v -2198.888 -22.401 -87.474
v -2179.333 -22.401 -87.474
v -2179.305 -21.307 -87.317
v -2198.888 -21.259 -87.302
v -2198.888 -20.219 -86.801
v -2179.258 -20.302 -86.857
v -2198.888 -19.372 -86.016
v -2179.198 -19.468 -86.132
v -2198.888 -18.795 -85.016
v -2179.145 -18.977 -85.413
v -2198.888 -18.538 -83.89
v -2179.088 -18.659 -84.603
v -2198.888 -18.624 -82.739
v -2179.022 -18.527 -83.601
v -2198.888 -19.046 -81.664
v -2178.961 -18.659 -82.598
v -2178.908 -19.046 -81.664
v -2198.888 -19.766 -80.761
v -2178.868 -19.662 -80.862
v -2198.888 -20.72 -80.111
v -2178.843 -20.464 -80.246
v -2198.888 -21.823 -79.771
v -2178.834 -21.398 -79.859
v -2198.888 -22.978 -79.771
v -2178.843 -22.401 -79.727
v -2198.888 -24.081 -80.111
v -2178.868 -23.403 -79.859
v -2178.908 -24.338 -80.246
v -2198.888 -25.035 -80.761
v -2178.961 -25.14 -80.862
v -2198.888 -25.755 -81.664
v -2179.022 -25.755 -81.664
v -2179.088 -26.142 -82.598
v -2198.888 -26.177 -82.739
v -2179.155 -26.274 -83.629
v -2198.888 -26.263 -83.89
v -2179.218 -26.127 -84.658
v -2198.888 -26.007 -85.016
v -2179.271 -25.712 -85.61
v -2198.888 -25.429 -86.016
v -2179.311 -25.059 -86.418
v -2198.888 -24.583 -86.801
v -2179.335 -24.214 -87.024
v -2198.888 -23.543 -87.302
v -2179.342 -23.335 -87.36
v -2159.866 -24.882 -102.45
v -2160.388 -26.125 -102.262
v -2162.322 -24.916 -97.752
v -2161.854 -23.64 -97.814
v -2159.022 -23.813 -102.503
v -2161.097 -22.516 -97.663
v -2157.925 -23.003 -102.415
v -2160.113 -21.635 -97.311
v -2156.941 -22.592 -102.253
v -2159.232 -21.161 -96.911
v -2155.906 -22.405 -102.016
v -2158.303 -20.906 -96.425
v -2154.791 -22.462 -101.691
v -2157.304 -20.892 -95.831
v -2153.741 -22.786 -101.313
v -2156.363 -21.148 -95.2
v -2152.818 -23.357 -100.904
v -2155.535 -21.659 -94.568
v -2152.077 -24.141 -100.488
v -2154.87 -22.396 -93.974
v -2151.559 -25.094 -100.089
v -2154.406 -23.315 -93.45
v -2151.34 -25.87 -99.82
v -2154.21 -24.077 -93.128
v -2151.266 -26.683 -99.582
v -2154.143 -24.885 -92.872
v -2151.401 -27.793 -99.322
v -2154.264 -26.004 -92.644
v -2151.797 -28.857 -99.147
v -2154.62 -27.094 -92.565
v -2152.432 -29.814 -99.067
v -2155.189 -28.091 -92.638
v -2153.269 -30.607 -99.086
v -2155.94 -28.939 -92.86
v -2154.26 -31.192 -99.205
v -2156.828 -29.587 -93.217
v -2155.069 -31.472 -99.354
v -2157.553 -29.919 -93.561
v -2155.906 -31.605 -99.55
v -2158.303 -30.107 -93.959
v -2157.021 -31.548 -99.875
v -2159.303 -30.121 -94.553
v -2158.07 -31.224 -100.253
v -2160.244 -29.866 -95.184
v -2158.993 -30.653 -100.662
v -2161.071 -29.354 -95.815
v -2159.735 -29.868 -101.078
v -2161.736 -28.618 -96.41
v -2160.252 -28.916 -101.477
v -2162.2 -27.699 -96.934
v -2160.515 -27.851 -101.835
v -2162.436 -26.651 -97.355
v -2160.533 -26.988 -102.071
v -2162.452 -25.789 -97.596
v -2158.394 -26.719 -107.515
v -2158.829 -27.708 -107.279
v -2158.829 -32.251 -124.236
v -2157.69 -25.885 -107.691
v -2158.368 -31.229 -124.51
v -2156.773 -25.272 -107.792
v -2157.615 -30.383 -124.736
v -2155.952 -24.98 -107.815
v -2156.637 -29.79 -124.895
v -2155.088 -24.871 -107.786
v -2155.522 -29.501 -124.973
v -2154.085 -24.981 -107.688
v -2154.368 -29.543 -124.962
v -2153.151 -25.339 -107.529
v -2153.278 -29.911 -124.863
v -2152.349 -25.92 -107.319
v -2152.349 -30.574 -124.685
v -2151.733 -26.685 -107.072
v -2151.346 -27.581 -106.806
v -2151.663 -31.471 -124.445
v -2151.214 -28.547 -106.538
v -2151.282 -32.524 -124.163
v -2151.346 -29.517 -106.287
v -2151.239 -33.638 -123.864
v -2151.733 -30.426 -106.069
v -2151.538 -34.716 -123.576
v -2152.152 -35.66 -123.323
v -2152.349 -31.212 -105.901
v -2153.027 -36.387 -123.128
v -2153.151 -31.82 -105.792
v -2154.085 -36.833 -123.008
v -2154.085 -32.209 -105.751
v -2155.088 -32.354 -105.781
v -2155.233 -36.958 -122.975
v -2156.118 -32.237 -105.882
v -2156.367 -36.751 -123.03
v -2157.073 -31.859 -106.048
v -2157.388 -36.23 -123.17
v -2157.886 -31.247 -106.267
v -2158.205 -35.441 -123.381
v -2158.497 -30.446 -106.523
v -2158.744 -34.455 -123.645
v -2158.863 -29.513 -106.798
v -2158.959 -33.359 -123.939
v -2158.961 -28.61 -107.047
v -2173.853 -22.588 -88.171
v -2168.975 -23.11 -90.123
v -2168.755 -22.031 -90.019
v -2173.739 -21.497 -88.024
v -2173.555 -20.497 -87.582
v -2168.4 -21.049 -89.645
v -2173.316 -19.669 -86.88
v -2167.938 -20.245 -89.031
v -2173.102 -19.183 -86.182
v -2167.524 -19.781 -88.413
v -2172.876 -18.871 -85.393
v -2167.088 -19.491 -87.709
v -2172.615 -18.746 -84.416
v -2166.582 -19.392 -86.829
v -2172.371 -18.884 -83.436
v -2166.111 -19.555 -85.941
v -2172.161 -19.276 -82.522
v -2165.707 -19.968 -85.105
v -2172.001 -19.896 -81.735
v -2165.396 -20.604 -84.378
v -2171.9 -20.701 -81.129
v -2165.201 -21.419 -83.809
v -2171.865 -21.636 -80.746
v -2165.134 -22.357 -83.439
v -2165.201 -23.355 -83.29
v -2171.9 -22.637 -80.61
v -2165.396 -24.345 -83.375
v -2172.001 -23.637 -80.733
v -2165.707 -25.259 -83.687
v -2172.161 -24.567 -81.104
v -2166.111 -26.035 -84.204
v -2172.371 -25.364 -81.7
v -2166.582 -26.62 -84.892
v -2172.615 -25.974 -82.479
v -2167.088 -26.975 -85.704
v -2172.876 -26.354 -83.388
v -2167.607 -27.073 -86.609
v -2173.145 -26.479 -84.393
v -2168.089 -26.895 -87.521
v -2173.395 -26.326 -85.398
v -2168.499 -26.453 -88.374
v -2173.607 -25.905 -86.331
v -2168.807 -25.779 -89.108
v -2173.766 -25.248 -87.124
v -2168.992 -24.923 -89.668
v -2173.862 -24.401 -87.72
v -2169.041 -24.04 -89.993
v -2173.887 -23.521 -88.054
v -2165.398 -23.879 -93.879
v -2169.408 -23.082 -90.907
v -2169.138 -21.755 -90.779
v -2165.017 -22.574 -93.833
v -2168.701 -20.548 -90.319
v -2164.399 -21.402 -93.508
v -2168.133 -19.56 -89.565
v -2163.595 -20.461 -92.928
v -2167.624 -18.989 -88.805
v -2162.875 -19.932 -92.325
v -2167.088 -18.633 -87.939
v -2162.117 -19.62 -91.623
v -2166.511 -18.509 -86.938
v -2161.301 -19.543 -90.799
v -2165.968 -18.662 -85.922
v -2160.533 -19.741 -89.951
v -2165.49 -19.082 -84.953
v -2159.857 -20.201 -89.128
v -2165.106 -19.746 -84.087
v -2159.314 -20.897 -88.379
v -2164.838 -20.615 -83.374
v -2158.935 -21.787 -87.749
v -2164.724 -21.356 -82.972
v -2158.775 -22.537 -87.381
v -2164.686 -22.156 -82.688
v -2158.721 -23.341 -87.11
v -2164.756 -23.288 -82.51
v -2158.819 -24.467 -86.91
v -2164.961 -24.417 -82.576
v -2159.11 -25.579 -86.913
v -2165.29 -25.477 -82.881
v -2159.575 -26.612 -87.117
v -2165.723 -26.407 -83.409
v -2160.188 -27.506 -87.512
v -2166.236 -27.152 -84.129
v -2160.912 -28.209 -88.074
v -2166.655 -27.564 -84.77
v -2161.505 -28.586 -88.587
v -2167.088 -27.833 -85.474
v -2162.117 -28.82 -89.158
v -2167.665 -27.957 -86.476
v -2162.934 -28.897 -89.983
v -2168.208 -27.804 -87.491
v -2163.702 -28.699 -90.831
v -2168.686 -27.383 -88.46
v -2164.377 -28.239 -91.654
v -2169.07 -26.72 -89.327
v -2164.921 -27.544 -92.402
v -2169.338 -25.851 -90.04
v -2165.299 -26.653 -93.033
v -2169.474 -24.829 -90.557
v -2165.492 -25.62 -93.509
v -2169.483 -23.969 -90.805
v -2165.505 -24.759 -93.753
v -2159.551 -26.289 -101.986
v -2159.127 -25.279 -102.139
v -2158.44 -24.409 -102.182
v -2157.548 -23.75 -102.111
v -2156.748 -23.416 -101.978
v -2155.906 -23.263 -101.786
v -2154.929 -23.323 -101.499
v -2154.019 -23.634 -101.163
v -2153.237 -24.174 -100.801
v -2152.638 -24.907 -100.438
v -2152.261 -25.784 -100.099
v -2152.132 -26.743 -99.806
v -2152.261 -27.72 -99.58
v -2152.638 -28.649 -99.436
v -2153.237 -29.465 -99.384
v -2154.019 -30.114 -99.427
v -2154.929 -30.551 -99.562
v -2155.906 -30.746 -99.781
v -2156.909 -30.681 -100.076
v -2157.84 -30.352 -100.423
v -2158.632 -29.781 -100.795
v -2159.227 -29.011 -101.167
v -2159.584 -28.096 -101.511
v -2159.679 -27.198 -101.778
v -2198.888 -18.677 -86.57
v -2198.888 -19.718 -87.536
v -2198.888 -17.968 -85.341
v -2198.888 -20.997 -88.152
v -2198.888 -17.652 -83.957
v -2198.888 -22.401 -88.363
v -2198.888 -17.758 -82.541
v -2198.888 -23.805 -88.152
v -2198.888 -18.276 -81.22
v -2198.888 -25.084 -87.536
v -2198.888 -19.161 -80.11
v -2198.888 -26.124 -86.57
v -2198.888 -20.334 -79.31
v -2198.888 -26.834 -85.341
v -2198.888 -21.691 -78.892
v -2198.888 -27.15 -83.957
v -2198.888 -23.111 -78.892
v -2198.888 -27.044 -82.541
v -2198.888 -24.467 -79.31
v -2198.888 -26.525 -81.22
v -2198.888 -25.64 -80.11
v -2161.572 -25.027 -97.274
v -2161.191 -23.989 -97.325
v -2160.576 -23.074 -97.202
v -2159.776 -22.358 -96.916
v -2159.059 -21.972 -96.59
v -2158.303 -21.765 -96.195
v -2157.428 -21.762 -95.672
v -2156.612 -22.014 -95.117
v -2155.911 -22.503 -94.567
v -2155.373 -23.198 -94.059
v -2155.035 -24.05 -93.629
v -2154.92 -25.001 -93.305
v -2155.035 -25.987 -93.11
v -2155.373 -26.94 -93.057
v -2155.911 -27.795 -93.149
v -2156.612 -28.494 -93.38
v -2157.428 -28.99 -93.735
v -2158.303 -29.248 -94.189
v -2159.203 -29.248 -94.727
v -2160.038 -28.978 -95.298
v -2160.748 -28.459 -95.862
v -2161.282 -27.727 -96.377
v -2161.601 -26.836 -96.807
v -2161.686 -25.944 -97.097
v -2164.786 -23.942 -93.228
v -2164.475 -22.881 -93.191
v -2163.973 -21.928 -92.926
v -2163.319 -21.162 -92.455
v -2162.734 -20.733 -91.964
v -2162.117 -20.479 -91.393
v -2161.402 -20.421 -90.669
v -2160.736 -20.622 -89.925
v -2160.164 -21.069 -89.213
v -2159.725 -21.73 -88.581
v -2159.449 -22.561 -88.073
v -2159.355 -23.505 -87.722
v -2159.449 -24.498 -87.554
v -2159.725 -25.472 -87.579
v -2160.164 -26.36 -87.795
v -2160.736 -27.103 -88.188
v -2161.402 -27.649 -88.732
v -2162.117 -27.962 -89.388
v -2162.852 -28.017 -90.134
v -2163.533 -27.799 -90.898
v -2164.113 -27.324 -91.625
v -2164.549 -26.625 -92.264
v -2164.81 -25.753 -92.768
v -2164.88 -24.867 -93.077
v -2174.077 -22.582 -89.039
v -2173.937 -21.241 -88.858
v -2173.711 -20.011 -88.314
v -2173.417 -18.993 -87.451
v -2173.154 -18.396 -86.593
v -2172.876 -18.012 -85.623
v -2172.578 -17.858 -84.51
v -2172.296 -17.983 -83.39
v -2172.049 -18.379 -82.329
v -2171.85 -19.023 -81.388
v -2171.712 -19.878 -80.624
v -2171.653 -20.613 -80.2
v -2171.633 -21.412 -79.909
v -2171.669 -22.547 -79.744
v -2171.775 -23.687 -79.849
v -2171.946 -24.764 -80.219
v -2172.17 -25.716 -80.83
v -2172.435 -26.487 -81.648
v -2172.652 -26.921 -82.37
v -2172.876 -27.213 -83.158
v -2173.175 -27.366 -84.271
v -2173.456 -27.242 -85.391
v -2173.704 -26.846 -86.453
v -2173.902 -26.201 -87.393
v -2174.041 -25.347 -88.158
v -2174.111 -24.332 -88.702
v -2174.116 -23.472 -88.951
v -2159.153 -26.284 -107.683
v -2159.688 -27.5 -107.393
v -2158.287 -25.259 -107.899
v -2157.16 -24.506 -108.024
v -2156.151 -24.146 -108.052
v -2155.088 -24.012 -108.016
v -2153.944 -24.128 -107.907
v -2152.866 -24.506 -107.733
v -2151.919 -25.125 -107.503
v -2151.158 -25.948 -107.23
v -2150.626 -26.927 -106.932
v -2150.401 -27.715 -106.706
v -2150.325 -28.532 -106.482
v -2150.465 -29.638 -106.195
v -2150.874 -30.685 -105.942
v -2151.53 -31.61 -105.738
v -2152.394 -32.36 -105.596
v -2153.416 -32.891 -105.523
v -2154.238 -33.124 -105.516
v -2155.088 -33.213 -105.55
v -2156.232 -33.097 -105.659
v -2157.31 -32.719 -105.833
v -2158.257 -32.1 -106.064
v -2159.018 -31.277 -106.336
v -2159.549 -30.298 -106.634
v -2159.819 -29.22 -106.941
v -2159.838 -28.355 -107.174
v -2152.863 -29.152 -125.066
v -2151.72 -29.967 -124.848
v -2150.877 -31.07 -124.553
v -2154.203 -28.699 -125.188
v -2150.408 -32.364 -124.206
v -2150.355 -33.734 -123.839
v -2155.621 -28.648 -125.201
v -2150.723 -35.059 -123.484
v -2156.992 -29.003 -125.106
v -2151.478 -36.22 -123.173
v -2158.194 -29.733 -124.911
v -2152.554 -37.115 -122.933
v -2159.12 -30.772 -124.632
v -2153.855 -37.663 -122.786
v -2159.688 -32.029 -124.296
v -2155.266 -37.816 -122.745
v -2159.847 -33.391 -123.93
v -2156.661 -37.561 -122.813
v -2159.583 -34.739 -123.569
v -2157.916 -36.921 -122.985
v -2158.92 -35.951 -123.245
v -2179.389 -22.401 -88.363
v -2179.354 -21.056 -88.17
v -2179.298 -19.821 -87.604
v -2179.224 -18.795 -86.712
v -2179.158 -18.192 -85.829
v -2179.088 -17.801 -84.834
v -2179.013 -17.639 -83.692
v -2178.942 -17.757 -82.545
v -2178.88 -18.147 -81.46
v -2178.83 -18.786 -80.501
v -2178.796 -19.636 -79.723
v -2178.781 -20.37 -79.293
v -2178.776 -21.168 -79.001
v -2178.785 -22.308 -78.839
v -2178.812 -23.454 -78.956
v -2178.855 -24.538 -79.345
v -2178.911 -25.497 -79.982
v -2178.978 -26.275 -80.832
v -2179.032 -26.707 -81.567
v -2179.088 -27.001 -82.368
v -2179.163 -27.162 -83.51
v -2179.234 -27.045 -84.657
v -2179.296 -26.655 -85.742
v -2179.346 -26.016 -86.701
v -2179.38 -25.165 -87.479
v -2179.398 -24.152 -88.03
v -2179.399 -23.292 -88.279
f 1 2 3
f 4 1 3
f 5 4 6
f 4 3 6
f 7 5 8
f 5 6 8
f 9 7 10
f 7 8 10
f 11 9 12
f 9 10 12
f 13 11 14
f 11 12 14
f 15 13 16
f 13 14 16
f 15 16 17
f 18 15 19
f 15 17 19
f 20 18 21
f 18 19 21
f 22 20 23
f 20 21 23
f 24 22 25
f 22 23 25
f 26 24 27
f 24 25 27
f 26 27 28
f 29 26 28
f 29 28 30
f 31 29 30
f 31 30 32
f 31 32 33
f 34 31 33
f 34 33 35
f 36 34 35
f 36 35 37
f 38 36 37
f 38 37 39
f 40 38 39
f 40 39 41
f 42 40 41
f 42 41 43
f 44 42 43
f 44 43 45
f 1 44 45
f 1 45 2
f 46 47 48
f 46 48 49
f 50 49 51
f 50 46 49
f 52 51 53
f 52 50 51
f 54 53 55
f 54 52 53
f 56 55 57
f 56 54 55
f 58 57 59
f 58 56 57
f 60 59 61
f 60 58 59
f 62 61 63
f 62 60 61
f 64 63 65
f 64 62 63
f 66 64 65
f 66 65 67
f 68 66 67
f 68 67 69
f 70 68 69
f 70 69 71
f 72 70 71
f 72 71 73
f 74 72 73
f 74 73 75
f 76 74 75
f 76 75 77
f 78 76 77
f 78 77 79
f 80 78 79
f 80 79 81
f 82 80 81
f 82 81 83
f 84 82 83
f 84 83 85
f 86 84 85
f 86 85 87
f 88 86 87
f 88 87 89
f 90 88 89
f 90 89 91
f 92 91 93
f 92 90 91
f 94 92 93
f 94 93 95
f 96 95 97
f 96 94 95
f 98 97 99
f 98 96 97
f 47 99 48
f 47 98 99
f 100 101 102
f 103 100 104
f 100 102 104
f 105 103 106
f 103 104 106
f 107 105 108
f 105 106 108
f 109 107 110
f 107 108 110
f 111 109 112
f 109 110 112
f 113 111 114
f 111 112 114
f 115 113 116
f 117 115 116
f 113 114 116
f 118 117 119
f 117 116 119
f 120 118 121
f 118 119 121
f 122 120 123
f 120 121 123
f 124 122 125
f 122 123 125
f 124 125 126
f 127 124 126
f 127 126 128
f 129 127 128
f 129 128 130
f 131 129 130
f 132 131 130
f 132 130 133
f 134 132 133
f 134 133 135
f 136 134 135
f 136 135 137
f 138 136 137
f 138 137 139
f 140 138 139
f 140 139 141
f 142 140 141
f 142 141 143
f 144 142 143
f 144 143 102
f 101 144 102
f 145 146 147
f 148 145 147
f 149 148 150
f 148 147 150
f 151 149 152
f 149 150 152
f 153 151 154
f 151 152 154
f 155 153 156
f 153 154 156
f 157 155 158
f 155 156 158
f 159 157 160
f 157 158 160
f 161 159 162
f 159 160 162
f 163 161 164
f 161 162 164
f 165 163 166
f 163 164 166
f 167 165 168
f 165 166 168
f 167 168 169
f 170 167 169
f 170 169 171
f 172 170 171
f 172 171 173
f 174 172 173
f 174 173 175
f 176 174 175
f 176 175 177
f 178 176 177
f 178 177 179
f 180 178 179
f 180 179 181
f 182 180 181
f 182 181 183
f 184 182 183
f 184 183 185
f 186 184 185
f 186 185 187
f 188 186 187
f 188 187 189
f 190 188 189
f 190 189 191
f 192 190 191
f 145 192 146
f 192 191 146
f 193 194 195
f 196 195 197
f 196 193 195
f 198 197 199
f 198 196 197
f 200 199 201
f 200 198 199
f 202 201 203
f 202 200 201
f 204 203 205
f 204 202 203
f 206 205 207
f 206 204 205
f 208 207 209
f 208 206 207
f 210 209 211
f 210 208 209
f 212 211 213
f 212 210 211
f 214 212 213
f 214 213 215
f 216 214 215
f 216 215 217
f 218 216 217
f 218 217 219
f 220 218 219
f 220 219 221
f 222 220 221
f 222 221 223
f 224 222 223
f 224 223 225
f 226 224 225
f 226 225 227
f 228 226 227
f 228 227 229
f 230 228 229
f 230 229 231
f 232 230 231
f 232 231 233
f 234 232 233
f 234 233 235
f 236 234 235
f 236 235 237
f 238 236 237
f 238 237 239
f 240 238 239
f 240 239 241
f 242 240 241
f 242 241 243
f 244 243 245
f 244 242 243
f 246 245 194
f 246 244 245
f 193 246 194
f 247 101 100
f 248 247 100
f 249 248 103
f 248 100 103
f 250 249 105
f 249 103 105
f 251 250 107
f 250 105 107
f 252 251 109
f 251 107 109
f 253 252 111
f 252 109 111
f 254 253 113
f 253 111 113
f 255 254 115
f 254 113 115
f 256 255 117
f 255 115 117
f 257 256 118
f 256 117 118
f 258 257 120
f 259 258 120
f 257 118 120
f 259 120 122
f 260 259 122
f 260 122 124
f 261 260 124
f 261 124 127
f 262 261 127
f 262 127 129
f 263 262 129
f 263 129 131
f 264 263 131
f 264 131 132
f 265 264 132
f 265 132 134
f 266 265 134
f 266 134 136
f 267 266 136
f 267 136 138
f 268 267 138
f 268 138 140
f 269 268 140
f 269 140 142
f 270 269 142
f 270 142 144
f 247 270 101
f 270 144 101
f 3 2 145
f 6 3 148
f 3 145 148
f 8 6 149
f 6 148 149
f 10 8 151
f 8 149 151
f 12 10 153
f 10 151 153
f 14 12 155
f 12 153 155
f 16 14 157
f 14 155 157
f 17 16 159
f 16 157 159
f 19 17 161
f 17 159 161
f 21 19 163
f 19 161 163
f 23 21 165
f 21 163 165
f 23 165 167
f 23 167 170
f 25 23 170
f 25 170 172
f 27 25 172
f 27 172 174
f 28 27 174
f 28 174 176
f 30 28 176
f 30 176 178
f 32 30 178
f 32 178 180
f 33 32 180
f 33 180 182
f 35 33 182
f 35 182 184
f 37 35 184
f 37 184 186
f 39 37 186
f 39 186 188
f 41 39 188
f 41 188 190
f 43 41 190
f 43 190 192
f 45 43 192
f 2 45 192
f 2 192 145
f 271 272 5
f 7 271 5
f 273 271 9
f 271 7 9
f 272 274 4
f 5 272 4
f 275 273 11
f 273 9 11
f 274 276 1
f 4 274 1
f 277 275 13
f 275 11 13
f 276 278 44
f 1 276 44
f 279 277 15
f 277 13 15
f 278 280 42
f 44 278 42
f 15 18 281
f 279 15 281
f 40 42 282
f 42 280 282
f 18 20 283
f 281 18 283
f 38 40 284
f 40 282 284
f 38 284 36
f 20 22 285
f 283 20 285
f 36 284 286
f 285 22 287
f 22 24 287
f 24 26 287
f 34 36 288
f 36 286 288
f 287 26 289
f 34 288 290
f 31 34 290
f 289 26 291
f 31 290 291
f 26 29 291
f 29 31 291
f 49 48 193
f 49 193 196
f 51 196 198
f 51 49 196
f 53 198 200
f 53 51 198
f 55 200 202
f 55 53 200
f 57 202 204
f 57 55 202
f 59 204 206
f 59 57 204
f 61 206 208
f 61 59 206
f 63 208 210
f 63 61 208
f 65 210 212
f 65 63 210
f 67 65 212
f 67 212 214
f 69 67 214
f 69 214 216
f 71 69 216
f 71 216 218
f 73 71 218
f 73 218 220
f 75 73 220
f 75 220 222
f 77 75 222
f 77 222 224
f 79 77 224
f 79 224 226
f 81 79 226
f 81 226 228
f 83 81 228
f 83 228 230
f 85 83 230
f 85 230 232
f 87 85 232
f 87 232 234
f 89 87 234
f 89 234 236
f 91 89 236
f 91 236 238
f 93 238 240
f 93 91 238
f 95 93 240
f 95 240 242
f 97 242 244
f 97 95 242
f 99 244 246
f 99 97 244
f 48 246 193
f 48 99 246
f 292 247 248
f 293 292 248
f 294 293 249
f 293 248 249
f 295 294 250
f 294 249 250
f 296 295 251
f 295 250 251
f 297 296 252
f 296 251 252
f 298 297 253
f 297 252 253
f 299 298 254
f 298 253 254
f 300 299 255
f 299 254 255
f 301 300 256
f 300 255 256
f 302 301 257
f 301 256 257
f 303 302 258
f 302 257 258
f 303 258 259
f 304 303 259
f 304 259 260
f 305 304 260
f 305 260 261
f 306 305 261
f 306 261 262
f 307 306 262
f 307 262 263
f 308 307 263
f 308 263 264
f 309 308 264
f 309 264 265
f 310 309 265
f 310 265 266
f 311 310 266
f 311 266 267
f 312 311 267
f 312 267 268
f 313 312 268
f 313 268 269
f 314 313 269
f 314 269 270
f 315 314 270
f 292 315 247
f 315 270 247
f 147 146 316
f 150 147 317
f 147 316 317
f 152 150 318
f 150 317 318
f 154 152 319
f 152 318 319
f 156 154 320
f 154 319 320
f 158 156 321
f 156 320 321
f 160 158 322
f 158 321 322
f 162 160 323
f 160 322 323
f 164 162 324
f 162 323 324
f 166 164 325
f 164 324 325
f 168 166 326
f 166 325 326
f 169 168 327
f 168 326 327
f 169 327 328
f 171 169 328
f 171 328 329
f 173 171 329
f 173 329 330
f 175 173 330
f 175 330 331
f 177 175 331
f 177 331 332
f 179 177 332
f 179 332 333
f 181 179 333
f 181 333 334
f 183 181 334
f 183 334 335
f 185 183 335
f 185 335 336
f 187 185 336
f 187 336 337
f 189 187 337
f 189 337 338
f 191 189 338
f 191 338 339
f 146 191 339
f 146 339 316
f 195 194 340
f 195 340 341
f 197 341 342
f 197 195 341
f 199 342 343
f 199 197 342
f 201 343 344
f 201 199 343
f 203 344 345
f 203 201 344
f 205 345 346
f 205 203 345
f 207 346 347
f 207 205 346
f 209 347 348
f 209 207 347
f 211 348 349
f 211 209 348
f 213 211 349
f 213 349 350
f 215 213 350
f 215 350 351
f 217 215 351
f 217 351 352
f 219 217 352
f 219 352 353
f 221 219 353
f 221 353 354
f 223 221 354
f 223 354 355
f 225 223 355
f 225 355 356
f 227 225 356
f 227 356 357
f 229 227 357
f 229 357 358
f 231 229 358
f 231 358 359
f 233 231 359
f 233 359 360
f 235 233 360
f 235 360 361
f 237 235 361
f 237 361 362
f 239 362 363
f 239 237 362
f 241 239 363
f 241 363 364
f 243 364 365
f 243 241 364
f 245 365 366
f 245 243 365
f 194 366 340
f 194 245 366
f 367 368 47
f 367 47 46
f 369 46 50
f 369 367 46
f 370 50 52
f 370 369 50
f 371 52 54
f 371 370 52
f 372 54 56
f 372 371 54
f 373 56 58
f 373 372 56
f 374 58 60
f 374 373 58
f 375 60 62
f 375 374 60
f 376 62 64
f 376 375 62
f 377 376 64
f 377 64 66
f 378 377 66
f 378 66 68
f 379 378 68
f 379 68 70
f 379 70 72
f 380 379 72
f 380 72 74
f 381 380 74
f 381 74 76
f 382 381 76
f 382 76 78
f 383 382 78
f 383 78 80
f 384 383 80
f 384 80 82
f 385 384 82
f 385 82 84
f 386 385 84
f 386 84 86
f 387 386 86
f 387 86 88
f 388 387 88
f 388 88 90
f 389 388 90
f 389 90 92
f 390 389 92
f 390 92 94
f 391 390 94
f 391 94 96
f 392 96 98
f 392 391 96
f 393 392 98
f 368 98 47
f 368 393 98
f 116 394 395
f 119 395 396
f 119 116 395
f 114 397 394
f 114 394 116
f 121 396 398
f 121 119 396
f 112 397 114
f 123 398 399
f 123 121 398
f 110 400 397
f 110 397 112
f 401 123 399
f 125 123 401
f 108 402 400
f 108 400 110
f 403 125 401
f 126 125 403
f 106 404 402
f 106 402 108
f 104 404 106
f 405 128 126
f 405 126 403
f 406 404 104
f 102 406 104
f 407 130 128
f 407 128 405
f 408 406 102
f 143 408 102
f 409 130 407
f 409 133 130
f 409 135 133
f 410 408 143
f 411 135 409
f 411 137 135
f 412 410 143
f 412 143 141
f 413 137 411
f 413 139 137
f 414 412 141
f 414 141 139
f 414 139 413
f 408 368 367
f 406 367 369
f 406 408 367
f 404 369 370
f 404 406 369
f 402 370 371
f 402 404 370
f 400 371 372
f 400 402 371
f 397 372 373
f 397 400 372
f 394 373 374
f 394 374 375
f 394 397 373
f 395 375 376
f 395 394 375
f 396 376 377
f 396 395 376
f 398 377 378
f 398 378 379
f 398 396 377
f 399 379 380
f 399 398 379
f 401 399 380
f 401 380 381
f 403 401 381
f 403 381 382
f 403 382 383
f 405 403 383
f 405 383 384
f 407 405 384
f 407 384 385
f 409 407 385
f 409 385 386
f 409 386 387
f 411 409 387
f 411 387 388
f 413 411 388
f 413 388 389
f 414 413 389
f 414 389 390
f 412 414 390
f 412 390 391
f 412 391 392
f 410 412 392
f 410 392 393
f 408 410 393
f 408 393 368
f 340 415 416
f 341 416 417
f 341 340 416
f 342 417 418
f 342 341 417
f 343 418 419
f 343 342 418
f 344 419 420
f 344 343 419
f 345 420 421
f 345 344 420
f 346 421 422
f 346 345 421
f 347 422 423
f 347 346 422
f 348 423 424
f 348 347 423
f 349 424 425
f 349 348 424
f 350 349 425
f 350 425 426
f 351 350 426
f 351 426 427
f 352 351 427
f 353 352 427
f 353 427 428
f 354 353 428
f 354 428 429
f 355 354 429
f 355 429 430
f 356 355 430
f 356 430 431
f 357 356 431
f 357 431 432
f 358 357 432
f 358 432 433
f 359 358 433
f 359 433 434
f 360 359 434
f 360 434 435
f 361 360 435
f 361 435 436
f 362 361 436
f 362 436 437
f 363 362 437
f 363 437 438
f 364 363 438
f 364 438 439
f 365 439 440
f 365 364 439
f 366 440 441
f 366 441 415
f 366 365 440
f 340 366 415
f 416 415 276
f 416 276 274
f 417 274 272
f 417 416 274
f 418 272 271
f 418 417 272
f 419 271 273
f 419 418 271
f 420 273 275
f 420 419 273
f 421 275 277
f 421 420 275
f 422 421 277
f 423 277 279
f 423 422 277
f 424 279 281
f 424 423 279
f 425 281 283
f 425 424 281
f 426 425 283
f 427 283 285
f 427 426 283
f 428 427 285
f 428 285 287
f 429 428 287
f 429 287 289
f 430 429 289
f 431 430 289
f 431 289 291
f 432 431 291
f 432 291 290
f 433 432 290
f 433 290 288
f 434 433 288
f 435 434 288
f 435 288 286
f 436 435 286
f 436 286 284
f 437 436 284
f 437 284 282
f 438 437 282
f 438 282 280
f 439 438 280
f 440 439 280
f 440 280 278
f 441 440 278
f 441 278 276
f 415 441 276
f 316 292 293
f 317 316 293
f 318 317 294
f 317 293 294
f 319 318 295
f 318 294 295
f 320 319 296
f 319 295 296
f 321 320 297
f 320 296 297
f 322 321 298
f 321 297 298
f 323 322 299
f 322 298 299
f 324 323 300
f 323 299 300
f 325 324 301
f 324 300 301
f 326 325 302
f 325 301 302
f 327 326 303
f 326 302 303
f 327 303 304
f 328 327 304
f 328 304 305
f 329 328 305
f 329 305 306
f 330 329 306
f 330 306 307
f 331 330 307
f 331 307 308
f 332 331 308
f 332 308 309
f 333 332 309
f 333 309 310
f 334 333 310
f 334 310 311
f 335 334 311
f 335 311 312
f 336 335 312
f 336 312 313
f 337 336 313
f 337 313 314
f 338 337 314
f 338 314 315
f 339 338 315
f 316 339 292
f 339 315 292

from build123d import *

# Parameters (mm, degrees)
PROFILE_R   = 4.7625
PROFILE_R_2 = 3.8735


with BuildPart() as part:
    # Tube: sweep along a curve in space
    with BuildLine() as tube_path:
        Line((-2198.887960479, -22.400788354, -83.600880265), (-2179.087960479, -22.400788354, -83.600880265))
        Line((-2179.087960479, -22.400788354, -83.600880265), (-2172.876303396, -22.612445436, -84.390795251))
        Line((-2172.876303396, -22.612445436, -84.390795251), (-2167.087960479, -23.232992603, -86.706708807))
        Line((-2167.087960479, -23.232992603, -86.706708807), (-2162.11739773, -24.220140591, -90.390795251))
        Line((-2162.11739773, -24.220140591, -90.390795251), (-2158.303350788, -25.506616895, -95.191990181))
        Line((-2158.303350788, -25.506616895, -95.191990181), (-2155.905740648, -27.004750281, -100.783100096))
        Line((-2155.905740648, -27.004750281, -100.783100096), (-2155.087960479, -28.612445436, -106.783100096))
        Line((-2155.087960479, -28.612445436, -106.783100096), (-2155.087960479, -33.219424439, -123.976579804))
    # Profile → Tube (sweep)
    with BuildSketch(Plane(origin=(-2198.887960479, 0, 0), x_dir=(0, 0, -1), z_dir=(1, 0, 0))):
        with Locations((83.600880265, -22.400788354)):
            Circle(PROFILE_R)
        with Locations((83.600880265, -22.400788354)):
            Circle(PROFILE_R_2, mode=Mode.SUBTRACT)
    sweep(path=tube_path.line, transition=Transition.RIGHT)


solid = part.part
